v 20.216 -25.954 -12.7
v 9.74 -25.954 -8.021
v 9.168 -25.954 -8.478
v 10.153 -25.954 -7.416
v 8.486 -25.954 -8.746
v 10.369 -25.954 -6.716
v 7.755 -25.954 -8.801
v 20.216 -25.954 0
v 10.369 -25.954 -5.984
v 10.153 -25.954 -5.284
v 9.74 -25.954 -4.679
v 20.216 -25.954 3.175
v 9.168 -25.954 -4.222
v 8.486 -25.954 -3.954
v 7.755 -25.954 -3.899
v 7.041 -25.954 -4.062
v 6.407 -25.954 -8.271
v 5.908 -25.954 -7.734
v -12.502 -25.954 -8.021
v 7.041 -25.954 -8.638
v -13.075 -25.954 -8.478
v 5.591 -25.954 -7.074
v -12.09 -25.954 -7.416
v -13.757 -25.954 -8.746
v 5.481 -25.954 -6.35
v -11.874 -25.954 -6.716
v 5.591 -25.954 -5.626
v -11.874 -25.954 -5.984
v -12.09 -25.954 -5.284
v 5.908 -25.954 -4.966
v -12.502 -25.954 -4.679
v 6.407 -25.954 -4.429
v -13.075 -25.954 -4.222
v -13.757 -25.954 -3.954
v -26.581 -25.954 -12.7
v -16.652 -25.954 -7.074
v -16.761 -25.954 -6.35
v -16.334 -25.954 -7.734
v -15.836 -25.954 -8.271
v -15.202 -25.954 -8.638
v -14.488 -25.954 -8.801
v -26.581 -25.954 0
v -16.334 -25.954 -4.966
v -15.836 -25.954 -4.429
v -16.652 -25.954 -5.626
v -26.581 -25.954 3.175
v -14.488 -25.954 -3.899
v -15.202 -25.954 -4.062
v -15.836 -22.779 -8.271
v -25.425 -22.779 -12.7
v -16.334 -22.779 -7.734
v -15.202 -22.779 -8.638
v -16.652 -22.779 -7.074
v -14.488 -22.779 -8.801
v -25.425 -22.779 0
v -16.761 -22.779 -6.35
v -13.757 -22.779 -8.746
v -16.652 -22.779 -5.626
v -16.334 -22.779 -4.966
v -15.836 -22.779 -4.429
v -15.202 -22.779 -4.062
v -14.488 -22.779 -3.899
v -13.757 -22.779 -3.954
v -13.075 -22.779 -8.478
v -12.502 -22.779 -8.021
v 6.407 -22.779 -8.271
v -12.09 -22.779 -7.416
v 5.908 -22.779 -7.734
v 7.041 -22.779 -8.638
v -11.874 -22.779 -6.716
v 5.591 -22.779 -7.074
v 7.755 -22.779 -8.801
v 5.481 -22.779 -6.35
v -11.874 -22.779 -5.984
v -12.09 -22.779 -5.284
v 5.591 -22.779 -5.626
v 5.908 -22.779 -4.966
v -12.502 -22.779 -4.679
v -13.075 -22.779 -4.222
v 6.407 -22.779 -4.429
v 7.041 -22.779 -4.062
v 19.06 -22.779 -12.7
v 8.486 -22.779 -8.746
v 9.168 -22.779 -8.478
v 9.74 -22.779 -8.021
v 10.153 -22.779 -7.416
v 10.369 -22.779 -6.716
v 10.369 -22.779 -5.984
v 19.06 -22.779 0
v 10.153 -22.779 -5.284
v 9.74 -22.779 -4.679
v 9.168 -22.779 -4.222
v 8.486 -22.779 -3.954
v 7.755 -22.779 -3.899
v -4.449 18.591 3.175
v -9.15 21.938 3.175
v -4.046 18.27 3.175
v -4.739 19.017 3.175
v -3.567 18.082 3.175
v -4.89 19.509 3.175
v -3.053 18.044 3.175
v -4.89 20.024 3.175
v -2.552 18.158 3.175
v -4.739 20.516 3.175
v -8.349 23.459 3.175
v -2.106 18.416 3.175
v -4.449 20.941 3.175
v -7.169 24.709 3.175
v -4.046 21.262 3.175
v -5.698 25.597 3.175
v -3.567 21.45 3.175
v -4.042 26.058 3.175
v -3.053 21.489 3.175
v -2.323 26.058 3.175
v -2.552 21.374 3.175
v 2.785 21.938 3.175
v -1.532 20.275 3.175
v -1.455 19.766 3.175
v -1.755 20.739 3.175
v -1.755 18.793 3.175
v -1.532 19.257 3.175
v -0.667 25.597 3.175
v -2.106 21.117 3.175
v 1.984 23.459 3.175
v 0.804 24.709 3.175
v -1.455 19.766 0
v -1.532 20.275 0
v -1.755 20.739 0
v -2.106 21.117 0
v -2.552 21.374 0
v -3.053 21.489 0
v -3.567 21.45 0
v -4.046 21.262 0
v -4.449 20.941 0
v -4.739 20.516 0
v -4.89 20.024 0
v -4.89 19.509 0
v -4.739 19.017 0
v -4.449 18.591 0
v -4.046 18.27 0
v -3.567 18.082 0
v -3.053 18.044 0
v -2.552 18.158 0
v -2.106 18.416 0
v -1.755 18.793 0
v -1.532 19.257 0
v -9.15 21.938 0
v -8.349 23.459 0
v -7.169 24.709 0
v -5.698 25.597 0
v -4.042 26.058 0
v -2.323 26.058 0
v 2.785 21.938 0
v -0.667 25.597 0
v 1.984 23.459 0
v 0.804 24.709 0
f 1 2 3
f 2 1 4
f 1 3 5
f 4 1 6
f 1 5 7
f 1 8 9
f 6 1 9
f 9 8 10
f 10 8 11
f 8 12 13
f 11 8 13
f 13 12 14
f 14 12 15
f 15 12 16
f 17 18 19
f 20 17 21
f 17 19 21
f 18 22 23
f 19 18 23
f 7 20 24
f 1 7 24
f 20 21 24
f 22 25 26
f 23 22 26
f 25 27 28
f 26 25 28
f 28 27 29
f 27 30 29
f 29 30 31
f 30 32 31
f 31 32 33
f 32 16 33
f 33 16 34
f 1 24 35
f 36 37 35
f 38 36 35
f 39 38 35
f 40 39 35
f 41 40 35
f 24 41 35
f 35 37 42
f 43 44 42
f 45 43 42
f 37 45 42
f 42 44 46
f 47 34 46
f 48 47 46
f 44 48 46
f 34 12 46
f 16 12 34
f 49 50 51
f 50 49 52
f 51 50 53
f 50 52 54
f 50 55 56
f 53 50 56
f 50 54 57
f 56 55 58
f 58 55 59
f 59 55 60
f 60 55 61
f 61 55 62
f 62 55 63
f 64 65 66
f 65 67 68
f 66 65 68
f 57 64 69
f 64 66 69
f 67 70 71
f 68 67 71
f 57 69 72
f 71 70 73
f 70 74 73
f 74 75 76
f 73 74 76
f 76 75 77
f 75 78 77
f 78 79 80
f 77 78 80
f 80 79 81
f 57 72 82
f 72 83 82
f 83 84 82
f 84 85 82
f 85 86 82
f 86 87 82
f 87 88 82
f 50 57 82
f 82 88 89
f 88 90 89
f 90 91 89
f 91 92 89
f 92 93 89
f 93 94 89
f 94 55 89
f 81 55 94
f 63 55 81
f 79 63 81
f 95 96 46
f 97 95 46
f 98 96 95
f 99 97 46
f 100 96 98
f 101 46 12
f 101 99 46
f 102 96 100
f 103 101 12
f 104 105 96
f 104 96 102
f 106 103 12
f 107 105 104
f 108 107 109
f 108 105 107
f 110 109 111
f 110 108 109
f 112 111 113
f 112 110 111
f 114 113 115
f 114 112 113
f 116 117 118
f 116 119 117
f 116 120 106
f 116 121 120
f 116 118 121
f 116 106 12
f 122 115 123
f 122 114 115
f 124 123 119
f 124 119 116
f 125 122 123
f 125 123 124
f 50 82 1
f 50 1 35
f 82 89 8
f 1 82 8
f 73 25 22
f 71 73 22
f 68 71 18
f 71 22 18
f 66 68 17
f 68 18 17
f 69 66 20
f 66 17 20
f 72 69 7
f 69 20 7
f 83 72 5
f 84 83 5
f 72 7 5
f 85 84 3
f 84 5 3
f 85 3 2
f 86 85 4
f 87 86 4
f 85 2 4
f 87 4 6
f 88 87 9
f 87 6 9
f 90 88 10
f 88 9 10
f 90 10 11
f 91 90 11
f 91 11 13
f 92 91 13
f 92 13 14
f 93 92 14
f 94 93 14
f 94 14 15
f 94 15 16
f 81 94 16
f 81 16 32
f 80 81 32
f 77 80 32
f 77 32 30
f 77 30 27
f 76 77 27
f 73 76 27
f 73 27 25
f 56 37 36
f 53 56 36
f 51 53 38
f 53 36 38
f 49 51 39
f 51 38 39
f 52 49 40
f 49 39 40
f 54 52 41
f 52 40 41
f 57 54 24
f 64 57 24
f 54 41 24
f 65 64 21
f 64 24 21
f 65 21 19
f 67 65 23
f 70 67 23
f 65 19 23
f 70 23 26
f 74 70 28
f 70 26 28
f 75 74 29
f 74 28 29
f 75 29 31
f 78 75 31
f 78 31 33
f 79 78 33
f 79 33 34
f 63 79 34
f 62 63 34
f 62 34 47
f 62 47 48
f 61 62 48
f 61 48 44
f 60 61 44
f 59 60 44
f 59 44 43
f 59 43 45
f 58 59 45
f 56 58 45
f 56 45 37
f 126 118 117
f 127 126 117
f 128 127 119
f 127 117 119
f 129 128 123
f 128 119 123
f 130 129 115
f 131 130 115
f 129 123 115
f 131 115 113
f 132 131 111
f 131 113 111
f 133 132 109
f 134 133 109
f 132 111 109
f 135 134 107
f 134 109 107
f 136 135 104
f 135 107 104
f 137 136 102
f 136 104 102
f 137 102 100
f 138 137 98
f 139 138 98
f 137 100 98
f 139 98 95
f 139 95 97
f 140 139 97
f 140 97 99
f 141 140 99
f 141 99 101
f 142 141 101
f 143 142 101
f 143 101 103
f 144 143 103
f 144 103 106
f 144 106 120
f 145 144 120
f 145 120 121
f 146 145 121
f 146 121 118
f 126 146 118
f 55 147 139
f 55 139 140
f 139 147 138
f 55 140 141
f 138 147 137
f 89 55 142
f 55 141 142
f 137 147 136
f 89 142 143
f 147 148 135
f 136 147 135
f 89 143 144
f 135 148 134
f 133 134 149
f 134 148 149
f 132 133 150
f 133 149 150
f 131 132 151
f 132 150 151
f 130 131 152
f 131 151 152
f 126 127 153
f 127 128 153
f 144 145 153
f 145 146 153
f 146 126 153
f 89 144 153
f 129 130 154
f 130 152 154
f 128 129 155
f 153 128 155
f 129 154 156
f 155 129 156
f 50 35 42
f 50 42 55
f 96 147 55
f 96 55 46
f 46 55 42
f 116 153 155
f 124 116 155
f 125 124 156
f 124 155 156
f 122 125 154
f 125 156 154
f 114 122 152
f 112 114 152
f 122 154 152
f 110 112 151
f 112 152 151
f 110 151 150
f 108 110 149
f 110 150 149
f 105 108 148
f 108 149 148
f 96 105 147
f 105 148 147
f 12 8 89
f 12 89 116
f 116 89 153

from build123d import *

# Parameters (mm, degrees)
BOSS_EXTRUDE1_DEPTH           = 3.175
TAP_DRILL_FOR_8_32_TAP1_D     = 3.4544
TAP_DRILL_FOR_8_32_TAP1_DEPTH = 3.302
TAP_DRILL_FOR_8_32_TAP1_TIP   = 1.037806461
BOSS_EXTRUDE2_DEPTH           = 12.7
F_8_CLEARANCE_HOLE1_D         = 4.9149


with BuildPart() as part:
    # Sketch1 → Boss-Extrude1 (new body)
    with BuildSketch(Plane.XY):
        with BuildLine():
            Line((-9.149583802, 21.93801689), (-26.580783626, -25.95381102))
            Line((-26.580783626, -25.95381102), (20.215712306, -25.95381102))
            Line((20.215712306, -25.95381102), (2.784512482, 21.93801689))
            ThreePointArc((2.784512482, 21.93801689), (-3.18253566, 26.11618898), (-9.149583802, 21.93801689))
        make_face()
    extrude(amount=BOSS_EXTRUDE1_DEPTH)

    # Tap Drill for #8-32 Tap1
    with Locations(Plane(origin=(-3.18253566, 19.76618898, 0), x_dir=(-1, 0, 0), z_dir=(0, 0, -1))):
        with Locations((0, 0)):
            Hole(TAP_DRILL_FOR_8_32_TAP1_D / 2, depth=TAP_DRILL_FOR_8_32_TAP1_DEPTH)
            with Locations((0, 0, -(TAP_DRILL_FOR_8_32_TAP1_DEPTH + TAP_DRILL_FOR_8_32_TAP1_TIP / 2))):  # 118° drill point
                Cone(0, TAP_DRILL_FOR_8_32_TAP1_D / 2, TAP_DRILL_FOR_8_32_TAP1_TIP, mode=Mode.SUBTRACT)

    # Sketch3 → Boss-Extrude2 (add)
    with BuildSketch(Plane(origin=(0, 0, 0), x_dir=(-1, 0, 0), z_dir=(0, 0, -1))):
        Polygon((-19.060106812, -22.77881102), (-20.215712306, -25.95381102), (26.580783626, -25.95381102), (25.425178132, -22.77881102), align=None)
    extrude(amount=BOSS_EXTRUDE2_DEPTH)

    # #8 Clearance Hole1 (through all)
    with Locations(Plane(origin=(-14.303856896, -22.77881102, -6.35), x_dir=(1, 0, 0), z_dir=(0, 1, 0))):
        with Locations((0, 0), (22.242642472, 0)):
            Hole(F_8_CLEARANCE_HOLE1_D / 2)


solid = part.part
